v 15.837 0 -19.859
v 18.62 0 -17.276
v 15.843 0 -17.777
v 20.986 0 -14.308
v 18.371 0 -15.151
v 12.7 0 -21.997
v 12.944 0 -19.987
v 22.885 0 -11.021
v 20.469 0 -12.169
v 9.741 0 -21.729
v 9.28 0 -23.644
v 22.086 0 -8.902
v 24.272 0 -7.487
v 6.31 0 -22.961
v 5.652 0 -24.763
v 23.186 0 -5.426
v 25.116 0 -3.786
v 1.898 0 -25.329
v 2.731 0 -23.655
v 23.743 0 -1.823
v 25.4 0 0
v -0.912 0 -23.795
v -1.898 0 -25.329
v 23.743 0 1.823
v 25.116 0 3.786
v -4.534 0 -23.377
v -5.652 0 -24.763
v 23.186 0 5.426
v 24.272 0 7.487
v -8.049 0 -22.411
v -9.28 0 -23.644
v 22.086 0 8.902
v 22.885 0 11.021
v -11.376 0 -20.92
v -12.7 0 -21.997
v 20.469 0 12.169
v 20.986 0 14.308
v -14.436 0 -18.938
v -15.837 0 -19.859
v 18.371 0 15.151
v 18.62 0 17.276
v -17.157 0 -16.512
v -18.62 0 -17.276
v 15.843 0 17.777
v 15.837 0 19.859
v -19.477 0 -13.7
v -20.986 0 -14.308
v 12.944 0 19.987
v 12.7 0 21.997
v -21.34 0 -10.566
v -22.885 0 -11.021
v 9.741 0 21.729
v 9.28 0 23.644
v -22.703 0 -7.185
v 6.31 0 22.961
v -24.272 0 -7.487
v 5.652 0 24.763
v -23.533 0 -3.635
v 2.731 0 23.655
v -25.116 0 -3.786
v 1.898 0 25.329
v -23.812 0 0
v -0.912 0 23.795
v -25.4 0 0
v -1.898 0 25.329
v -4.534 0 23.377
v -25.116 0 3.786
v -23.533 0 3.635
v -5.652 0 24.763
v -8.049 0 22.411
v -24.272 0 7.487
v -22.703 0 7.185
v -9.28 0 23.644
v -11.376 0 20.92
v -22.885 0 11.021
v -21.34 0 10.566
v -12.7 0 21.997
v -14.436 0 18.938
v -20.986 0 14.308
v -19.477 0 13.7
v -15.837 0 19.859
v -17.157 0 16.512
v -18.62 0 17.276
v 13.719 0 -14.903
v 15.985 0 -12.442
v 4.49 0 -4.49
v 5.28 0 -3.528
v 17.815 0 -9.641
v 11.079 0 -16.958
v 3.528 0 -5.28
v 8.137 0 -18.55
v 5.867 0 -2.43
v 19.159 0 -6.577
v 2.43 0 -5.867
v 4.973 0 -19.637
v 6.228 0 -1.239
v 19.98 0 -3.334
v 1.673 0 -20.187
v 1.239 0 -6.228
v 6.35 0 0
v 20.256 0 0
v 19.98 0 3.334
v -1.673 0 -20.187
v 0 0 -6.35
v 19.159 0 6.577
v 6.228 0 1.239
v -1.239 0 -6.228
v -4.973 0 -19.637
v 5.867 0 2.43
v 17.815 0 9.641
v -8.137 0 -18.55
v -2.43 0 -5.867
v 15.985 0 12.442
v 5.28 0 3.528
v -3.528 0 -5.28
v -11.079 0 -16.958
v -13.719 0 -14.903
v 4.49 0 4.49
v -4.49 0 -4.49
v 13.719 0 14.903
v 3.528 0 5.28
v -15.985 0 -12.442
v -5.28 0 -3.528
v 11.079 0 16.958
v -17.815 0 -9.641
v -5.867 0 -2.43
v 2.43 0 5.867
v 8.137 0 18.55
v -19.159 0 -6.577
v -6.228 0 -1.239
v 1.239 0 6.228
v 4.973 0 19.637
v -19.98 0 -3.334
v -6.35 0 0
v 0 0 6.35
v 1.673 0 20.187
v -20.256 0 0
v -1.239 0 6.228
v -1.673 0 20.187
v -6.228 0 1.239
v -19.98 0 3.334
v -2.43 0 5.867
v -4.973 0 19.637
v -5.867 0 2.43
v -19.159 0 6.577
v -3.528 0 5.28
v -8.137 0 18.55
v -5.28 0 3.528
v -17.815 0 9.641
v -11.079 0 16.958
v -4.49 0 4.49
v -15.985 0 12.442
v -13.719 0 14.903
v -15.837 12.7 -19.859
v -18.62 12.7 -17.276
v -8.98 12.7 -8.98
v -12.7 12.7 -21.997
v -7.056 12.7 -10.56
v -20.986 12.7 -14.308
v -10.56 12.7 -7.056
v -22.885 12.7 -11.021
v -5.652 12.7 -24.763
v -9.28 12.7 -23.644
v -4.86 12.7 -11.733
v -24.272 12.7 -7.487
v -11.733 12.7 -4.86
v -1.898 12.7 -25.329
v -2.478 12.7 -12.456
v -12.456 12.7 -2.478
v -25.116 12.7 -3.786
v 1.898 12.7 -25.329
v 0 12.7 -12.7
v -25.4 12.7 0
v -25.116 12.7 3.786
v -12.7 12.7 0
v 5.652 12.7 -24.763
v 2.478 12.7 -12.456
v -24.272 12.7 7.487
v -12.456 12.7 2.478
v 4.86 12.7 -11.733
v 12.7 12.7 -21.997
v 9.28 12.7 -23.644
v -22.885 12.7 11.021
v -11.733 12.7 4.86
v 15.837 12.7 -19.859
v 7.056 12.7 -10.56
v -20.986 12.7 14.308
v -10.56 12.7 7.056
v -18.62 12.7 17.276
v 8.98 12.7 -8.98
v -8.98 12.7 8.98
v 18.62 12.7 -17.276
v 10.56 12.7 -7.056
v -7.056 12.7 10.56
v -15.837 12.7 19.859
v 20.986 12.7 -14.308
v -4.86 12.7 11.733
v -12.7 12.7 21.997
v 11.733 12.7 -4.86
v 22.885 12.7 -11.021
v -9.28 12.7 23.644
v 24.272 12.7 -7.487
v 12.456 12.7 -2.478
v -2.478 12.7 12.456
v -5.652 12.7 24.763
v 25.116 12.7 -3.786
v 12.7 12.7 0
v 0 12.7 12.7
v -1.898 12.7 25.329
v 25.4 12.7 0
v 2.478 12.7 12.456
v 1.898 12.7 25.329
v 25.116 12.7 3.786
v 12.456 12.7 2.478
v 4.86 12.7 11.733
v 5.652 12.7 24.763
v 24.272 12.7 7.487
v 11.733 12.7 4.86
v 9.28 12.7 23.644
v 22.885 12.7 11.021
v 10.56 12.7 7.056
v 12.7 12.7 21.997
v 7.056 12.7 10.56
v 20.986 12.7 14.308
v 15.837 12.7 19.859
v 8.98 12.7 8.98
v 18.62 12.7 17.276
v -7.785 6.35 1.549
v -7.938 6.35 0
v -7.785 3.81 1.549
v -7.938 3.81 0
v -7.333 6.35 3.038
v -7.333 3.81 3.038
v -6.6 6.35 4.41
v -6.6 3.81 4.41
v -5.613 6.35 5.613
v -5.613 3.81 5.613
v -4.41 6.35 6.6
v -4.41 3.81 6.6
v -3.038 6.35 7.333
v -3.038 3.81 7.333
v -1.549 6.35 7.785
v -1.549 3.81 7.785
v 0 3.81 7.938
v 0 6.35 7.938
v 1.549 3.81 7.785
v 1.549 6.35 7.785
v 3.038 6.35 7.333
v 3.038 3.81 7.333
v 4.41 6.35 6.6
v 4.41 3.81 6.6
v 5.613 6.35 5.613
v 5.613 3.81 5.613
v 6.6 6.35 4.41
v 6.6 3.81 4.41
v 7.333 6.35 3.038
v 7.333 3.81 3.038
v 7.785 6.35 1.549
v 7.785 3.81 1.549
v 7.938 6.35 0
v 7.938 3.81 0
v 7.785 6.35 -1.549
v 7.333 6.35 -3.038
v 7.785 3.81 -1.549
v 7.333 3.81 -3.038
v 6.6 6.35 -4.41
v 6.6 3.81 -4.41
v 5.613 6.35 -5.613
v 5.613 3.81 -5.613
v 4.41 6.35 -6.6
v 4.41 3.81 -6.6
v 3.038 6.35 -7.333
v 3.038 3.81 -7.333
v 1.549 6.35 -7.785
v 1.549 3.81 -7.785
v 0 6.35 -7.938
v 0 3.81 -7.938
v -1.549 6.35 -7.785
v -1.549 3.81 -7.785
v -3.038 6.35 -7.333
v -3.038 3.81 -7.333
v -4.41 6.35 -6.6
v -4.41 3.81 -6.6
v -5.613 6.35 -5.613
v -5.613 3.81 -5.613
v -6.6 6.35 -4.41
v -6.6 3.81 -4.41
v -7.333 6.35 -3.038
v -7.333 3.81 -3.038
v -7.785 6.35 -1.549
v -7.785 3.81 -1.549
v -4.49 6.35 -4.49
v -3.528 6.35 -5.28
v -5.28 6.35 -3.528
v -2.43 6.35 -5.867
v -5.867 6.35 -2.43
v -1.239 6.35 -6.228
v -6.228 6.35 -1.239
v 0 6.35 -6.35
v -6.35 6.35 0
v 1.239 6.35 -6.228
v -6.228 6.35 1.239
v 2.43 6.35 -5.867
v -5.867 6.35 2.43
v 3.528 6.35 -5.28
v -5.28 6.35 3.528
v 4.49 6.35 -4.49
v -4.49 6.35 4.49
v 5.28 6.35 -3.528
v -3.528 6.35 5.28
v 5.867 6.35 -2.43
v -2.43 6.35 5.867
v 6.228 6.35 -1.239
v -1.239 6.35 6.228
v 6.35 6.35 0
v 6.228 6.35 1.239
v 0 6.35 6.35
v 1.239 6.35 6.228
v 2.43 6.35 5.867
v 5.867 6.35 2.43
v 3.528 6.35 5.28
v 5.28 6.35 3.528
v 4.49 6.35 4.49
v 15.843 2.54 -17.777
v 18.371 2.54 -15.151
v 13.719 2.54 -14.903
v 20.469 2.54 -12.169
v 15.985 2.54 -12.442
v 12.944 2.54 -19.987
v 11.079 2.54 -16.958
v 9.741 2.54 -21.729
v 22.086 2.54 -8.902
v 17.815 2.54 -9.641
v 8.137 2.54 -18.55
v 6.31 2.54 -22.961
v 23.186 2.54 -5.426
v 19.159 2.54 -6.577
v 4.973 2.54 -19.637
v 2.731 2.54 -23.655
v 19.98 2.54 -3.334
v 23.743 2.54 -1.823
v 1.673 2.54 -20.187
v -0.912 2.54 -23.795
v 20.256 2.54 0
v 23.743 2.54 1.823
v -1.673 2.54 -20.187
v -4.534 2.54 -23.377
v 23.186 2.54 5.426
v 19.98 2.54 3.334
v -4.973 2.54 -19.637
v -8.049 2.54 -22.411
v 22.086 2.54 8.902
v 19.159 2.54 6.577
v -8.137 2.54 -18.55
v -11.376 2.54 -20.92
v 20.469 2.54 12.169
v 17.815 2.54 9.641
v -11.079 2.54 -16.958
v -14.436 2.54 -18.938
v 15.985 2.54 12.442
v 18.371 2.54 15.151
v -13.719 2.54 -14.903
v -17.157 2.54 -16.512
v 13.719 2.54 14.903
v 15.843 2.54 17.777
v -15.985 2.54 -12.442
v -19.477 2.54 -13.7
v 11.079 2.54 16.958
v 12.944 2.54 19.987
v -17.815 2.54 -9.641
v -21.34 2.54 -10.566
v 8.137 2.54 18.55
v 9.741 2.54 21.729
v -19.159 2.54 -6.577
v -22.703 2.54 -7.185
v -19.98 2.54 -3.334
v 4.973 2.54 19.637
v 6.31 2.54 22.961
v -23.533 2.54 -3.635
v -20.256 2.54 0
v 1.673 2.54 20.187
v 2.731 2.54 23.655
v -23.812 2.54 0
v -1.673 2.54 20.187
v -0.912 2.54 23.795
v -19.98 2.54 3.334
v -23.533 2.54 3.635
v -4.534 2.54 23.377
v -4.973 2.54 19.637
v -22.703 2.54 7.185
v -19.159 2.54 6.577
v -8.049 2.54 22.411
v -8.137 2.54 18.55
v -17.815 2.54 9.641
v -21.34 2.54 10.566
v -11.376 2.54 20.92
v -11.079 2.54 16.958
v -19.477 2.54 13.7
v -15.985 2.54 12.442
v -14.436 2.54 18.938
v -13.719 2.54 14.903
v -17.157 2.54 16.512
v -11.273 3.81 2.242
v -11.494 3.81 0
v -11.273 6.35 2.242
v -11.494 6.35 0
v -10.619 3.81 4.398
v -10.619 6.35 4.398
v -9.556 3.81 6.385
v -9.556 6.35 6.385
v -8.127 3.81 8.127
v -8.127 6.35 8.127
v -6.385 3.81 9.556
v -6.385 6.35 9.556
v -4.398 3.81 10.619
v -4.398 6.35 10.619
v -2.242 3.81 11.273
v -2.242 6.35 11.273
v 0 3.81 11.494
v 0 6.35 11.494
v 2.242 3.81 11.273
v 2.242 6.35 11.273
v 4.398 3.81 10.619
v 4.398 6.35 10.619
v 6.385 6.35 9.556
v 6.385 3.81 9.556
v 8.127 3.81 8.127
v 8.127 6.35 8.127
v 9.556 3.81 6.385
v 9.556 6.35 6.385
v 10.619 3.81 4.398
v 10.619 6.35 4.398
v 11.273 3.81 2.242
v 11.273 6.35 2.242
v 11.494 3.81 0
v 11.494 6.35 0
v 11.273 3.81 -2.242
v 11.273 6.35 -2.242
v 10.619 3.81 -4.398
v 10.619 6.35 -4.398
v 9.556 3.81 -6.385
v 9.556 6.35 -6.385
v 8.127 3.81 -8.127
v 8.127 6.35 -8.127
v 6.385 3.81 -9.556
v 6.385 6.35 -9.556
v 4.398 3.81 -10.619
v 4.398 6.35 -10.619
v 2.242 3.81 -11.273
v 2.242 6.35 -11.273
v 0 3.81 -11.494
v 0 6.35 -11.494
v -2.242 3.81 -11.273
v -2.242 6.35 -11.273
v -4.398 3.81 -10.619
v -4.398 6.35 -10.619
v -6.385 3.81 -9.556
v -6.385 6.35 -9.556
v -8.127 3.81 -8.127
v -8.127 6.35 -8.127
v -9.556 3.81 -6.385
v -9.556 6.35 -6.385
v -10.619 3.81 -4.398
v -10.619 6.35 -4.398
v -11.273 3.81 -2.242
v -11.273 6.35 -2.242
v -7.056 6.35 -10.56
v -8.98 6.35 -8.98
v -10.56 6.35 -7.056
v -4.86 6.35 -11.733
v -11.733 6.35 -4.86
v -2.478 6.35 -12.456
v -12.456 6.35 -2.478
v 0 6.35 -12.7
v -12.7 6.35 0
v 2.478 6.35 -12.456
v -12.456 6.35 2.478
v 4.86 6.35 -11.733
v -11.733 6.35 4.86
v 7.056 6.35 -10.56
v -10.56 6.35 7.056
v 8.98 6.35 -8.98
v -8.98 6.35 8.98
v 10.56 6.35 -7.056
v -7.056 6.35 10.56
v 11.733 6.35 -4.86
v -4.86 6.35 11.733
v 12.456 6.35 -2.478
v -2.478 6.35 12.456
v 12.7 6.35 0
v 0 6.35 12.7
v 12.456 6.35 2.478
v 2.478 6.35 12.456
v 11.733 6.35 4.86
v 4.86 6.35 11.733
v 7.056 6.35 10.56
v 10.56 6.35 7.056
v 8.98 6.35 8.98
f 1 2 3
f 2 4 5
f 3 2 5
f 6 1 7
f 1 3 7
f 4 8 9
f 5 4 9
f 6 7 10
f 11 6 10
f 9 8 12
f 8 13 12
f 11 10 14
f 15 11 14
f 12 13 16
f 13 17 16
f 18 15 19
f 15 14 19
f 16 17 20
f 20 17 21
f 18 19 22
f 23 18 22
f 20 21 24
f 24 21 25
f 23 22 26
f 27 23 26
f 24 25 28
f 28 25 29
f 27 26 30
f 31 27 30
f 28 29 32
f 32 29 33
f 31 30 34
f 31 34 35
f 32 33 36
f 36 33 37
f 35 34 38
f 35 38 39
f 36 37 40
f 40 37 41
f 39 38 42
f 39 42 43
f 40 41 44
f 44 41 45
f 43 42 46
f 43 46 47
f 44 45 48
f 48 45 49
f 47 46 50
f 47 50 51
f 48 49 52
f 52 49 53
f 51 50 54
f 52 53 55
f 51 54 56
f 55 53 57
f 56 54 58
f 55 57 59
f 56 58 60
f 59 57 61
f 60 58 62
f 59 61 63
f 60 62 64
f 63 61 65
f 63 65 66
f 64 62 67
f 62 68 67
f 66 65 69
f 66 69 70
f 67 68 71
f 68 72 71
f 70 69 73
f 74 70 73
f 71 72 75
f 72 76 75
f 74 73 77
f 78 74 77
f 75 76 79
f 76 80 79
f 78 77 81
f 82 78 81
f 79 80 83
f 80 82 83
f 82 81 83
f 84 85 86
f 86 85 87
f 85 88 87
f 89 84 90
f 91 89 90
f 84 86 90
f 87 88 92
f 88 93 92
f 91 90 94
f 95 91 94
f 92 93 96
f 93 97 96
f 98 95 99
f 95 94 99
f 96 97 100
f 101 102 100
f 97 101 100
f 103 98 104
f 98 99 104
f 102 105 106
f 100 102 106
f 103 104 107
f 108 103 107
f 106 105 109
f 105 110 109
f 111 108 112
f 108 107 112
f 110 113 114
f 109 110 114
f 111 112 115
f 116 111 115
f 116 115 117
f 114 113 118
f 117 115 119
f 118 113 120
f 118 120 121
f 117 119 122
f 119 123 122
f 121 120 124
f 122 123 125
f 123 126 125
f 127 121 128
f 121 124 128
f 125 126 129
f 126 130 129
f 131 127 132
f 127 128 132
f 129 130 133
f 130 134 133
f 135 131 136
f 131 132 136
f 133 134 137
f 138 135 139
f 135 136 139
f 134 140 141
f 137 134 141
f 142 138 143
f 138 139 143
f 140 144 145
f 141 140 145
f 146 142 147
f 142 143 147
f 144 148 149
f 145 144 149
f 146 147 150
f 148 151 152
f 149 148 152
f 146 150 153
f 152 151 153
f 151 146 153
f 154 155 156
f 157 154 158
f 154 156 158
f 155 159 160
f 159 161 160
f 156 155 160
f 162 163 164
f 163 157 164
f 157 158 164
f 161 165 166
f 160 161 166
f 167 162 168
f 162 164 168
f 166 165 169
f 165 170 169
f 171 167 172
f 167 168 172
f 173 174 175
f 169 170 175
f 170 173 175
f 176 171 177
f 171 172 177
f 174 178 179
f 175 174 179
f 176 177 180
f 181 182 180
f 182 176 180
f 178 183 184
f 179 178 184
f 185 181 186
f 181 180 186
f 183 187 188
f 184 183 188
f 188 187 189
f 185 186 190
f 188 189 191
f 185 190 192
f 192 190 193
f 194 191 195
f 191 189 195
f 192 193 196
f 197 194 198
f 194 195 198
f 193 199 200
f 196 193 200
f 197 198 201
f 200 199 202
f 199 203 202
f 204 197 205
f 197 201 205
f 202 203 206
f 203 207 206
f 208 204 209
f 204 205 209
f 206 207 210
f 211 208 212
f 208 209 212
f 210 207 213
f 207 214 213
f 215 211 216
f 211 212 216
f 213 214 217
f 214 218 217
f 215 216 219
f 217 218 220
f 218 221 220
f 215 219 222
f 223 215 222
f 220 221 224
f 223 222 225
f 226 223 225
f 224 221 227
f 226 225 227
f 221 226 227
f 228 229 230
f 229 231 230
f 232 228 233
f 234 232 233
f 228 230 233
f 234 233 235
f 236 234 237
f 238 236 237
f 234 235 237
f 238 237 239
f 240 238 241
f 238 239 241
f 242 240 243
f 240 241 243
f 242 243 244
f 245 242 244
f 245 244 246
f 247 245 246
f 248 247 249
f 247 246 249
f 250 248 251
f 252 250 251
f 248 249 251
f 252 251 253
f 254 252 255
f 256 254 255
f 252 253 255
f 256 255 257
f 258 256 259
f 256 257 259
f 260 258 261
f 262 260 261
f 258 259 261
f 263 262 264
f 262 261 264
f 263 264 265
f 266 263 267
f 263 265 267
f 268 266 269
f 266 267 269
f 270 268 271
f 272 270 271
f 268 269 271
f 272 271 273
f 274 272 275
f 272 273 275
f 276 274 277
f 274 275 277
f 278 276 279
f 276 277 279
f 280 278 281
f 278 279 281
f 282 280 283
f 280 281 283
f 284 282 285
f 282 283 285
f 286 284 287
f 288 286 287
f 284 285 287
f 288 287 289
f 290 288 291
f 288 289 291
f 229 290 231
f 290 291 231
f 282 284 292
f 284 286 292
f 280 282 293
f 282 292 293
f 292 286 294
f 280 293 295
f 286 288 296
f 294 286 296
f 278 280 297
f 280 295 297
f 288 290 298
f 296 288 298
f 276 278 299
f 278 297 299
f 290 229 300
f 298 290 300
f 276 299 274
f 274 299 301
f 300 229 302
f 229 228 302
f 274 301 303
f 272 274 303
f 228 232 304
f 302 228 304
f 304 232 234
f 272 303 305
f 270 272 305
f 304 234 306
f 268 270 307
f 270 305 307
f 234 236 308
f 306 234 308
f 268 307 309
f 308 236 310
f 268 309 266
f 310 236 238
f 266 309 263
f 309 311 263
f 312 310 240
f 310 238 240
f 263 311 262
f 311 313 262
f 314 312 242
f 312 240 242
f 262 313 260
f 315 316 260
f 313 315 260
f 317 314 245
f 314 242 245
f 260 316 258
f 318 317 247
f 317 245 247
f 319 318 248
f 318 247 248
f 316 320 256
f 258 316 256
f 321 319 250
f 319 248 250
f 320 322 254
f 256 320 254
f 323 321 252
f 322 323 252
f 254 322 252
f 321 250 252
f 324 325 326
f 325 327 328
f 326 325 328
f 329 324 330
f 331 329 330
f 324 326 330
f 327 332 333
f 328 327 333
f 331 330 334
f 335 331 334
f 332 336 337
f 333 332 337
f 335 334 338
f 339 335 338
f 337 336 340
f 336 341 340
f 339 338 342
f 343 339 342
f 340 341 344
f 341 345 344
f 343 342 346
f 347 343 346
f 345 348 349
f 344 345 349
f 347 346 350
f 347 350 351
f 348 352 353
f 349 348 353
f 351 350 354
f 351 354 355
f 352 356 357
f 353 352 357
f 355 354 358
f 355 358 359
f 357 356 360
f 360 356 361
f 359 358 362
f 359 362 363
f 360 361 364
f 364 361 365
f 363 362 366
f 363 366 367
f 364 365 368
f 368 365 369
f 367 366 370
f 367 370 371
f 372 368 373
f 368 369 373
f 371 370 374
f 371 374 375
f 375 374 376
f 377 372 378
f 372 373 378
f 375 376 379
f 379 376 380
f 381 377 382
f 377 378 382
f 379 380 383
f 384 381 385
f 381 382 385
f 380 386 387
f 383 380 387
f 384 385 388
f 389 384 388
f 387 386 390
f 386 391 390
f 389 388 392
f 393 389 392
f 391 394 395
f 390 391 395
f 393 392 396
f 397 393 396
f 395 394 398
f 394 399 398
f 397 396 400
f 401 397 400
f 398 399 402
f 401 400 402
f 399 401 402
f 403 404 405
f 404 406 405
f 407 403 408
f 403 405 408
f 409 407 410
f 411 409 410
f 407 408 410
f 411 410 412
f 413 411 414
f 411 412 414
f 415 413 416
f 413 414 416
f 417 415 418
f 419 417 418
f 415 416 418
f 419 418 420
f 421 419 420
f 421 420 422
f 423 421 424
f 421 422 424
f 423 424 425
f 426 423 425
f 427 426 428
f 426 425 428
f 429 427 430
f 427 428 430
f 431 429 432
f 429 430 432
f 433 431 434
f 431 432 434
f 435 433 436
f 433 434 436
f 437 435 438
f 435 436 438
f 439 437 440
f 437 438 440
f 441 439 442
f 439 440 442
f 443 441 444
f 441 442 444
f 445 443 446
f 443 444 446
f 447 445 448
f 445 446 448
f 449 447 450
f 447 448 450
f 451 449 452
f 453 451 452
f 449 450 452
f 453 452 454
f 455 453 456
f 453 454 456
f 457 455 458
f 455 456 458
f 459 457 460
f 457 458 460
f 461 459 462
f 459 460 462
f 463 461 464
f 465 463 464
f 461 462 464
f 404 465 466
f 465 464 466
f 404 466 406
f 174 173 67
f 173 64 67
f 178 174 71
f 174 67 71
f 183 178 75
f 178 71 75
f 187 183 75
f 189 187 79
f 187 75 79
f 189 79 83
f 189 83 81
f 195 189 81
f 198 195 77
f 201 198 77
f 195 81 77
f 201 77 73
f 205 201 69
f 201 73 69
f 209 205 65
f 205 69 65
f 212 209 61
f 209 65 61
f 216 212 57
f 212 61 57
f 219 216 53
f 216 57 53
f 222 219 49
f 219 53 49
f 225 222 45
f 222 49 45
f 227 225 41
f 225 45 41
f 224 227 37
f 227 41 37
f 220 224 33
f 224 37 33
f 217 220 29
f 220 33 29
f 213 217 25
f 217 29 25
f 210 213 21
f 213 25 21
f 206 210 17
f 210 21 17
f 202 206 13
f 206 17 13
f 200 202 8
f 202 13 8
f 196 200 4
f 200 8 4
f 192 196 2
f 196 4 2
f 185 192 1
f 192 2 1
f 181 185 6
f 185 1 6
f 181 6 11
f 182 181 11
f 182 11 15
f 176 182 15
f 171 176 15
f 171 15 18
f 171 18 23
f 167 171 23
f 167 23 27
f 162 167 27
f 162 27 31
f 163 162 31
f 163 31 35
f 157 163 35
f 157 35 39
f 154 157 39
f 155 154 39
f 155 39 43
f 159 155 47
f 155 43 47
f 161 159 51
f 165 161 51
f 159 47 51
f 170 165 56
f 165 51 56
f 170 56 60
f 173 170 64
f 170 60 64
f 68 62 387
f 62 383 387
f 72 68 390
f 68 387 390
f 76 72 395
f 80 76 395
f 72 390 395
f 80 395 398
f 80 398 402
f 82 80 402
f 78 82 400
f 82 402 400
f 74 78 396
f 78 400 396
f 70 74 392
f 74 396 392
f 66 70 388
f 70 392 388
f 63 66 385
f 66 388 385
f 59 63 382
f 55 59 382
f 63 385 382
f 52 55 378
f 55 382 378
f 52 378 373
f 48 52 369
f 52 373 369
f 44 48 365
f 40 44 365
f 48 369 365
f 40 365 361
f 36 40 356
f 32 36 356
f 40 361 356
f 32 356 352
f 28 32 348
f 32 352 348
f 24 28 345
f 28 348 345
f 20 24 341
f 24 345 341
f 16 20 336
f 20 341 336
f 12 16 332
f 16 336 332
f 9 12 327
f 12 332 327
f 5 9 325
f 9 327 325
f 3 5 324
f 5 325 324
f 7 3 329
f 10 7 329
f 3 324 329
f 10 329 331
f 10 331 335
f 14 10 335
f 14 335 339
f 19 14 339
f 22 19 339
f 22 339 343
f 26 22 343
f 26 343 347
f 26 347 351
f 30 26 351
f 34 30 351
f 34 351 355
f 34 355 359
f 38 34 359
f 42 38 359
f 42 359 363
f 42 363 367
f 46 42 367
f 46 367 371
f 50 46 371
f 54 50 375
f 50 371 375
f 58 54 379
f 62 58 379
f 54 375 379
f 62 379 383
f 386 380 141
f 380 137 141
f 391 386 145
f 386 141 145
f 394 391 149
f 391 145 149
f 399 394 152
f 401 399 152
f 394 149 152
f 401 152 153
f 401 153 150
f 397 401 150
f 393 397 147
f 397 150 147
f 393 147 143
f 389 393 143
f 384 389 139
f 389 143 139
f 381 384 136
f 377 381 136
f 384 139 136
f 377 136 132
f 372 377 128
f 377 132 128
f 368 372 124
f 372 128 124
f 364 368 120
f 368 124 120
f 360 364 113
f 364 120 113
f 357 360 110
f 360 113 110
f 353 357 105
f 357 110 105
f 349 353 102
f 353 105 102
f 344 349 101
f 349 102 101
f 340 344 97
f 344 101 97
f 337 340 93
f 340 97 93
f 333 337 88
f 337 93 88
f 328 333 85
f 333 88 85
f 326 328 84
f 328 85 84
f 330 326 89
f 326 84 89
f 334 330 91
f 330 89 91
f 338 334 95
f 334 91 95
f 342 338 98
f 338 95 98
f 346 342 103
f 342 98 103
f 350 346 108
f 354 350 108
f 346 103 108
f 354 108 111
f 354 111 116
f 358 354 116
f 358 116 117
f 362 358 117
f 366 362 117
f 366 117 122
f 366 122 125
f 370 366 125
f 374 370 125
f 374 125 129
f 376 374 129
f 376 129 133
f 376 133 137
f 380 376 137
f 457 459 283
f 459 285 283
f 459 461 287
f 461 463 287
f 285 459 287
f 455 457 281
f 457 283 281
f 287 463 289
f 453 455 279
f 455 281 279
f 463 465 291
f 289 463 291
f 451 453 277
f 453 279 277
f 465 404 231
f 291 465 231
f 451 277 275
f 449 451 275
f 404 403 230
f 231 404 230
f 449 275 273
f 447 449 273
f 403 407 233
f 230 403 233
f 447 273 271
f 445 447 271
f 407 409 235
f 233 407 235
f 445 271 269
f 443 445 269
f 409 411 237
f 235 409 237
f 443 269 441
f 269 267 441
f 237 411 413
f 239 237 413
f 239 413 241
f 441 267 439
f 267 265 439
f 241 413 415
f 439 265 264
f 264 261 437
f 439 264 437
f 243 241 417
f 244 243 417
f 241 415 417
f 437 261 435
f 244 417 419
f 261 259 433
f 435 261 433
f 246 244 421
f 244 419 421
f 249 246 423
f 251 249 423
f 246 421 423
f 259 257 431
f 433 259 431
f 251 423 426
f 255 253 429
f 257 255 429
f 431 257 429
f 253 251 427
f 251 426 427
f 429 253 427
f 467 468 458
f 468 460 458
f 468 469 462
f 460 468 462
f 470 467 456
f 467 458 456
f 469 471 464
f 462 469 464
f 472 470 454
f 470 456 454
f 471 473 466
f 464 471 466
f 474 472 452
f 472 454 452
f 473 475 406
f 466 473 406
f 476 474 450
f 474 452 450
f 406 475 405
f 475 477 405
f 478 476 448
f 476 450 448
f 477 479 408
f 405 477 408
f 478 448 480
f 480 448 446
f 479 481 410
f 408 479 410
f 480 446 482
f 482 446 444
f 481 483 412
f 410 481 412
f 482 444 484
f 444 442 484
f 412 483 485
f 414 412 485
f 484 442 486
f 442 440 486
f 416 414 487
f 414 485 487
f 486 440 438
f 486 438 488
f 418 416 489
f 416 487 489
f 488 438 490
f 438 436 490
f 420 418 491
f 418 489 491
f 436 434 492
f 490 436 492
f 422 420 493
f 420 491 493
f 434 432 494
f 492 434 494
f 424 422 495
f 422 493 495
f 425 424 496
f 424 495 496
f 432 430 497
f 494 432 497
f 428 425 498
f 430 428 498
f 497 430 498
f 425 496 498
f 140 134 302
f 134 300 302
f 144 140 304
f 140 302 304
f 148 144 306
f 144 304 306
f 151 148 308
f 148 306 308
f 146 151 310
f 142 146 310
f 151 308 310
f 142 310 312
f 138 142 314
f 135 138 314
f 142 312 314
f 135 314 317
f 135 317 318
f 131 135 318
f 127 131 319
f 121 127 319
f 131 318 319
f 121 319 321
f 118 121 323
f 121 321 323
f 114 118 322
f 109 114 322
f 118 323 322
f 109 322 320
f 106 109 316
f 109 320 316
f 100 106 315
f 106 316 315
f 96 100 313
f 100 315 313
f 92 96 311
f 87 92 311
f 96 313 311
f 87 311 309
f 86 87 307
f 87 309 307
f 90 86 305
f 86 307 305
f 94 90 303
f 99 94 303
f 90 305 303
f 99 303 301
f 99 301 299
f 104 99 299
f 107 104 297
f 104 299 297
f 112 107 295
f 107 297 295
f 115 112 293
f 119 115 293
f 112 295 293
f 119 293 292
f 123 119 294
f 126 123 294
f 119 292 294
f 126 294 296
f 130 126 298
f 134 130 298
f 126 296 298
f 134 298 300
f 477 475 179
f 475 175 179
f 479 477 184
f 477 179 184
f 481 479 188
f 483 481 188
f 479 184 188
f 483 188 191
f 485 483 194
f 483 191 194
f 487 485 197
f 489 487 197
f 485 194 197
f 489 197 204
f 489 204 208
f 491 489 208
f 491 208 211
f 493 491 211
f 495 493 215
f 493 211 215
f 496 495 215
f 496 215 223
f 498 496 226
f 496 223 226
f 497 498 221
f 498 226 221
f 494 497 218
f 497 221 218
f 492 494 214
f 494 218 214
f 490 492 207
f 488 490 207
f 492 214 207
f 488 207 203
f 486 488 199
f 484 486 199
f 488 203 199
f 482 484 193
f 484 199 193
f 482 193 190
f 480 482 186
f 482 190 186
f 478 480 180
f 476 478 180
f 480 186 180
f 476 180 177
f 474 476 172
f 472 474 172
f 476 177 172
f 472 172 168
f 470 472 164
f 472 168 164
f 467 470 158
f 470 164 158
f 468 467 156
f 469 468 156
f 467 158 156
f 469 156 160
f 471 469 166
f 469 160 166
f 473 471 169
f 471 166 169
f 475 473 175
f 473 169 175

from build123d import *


with BuildPart() as part:
    # Sketch1 → Revolve1 (revolve)
    with BuildSketch(Plane.XY):
        Polygon((-6.35, 0), (-6.35, 6.35), (-7.9375, 6.35), (-7.9375, 3.81), (-11.4935, 3.81), (-11.4935, 6.35), (-12.7, 6.35), (-12.7, 12.7), (-25.4, 12.7), (-25.4, 0), (-23.8125, 0), (-23.8125, 2.54), (-20.2565, 2.54), (-20.2565, 0), align=None)
    revolve(axis=Axis((0, 0, 0), (0, 1, 0)))


solid = part.part
